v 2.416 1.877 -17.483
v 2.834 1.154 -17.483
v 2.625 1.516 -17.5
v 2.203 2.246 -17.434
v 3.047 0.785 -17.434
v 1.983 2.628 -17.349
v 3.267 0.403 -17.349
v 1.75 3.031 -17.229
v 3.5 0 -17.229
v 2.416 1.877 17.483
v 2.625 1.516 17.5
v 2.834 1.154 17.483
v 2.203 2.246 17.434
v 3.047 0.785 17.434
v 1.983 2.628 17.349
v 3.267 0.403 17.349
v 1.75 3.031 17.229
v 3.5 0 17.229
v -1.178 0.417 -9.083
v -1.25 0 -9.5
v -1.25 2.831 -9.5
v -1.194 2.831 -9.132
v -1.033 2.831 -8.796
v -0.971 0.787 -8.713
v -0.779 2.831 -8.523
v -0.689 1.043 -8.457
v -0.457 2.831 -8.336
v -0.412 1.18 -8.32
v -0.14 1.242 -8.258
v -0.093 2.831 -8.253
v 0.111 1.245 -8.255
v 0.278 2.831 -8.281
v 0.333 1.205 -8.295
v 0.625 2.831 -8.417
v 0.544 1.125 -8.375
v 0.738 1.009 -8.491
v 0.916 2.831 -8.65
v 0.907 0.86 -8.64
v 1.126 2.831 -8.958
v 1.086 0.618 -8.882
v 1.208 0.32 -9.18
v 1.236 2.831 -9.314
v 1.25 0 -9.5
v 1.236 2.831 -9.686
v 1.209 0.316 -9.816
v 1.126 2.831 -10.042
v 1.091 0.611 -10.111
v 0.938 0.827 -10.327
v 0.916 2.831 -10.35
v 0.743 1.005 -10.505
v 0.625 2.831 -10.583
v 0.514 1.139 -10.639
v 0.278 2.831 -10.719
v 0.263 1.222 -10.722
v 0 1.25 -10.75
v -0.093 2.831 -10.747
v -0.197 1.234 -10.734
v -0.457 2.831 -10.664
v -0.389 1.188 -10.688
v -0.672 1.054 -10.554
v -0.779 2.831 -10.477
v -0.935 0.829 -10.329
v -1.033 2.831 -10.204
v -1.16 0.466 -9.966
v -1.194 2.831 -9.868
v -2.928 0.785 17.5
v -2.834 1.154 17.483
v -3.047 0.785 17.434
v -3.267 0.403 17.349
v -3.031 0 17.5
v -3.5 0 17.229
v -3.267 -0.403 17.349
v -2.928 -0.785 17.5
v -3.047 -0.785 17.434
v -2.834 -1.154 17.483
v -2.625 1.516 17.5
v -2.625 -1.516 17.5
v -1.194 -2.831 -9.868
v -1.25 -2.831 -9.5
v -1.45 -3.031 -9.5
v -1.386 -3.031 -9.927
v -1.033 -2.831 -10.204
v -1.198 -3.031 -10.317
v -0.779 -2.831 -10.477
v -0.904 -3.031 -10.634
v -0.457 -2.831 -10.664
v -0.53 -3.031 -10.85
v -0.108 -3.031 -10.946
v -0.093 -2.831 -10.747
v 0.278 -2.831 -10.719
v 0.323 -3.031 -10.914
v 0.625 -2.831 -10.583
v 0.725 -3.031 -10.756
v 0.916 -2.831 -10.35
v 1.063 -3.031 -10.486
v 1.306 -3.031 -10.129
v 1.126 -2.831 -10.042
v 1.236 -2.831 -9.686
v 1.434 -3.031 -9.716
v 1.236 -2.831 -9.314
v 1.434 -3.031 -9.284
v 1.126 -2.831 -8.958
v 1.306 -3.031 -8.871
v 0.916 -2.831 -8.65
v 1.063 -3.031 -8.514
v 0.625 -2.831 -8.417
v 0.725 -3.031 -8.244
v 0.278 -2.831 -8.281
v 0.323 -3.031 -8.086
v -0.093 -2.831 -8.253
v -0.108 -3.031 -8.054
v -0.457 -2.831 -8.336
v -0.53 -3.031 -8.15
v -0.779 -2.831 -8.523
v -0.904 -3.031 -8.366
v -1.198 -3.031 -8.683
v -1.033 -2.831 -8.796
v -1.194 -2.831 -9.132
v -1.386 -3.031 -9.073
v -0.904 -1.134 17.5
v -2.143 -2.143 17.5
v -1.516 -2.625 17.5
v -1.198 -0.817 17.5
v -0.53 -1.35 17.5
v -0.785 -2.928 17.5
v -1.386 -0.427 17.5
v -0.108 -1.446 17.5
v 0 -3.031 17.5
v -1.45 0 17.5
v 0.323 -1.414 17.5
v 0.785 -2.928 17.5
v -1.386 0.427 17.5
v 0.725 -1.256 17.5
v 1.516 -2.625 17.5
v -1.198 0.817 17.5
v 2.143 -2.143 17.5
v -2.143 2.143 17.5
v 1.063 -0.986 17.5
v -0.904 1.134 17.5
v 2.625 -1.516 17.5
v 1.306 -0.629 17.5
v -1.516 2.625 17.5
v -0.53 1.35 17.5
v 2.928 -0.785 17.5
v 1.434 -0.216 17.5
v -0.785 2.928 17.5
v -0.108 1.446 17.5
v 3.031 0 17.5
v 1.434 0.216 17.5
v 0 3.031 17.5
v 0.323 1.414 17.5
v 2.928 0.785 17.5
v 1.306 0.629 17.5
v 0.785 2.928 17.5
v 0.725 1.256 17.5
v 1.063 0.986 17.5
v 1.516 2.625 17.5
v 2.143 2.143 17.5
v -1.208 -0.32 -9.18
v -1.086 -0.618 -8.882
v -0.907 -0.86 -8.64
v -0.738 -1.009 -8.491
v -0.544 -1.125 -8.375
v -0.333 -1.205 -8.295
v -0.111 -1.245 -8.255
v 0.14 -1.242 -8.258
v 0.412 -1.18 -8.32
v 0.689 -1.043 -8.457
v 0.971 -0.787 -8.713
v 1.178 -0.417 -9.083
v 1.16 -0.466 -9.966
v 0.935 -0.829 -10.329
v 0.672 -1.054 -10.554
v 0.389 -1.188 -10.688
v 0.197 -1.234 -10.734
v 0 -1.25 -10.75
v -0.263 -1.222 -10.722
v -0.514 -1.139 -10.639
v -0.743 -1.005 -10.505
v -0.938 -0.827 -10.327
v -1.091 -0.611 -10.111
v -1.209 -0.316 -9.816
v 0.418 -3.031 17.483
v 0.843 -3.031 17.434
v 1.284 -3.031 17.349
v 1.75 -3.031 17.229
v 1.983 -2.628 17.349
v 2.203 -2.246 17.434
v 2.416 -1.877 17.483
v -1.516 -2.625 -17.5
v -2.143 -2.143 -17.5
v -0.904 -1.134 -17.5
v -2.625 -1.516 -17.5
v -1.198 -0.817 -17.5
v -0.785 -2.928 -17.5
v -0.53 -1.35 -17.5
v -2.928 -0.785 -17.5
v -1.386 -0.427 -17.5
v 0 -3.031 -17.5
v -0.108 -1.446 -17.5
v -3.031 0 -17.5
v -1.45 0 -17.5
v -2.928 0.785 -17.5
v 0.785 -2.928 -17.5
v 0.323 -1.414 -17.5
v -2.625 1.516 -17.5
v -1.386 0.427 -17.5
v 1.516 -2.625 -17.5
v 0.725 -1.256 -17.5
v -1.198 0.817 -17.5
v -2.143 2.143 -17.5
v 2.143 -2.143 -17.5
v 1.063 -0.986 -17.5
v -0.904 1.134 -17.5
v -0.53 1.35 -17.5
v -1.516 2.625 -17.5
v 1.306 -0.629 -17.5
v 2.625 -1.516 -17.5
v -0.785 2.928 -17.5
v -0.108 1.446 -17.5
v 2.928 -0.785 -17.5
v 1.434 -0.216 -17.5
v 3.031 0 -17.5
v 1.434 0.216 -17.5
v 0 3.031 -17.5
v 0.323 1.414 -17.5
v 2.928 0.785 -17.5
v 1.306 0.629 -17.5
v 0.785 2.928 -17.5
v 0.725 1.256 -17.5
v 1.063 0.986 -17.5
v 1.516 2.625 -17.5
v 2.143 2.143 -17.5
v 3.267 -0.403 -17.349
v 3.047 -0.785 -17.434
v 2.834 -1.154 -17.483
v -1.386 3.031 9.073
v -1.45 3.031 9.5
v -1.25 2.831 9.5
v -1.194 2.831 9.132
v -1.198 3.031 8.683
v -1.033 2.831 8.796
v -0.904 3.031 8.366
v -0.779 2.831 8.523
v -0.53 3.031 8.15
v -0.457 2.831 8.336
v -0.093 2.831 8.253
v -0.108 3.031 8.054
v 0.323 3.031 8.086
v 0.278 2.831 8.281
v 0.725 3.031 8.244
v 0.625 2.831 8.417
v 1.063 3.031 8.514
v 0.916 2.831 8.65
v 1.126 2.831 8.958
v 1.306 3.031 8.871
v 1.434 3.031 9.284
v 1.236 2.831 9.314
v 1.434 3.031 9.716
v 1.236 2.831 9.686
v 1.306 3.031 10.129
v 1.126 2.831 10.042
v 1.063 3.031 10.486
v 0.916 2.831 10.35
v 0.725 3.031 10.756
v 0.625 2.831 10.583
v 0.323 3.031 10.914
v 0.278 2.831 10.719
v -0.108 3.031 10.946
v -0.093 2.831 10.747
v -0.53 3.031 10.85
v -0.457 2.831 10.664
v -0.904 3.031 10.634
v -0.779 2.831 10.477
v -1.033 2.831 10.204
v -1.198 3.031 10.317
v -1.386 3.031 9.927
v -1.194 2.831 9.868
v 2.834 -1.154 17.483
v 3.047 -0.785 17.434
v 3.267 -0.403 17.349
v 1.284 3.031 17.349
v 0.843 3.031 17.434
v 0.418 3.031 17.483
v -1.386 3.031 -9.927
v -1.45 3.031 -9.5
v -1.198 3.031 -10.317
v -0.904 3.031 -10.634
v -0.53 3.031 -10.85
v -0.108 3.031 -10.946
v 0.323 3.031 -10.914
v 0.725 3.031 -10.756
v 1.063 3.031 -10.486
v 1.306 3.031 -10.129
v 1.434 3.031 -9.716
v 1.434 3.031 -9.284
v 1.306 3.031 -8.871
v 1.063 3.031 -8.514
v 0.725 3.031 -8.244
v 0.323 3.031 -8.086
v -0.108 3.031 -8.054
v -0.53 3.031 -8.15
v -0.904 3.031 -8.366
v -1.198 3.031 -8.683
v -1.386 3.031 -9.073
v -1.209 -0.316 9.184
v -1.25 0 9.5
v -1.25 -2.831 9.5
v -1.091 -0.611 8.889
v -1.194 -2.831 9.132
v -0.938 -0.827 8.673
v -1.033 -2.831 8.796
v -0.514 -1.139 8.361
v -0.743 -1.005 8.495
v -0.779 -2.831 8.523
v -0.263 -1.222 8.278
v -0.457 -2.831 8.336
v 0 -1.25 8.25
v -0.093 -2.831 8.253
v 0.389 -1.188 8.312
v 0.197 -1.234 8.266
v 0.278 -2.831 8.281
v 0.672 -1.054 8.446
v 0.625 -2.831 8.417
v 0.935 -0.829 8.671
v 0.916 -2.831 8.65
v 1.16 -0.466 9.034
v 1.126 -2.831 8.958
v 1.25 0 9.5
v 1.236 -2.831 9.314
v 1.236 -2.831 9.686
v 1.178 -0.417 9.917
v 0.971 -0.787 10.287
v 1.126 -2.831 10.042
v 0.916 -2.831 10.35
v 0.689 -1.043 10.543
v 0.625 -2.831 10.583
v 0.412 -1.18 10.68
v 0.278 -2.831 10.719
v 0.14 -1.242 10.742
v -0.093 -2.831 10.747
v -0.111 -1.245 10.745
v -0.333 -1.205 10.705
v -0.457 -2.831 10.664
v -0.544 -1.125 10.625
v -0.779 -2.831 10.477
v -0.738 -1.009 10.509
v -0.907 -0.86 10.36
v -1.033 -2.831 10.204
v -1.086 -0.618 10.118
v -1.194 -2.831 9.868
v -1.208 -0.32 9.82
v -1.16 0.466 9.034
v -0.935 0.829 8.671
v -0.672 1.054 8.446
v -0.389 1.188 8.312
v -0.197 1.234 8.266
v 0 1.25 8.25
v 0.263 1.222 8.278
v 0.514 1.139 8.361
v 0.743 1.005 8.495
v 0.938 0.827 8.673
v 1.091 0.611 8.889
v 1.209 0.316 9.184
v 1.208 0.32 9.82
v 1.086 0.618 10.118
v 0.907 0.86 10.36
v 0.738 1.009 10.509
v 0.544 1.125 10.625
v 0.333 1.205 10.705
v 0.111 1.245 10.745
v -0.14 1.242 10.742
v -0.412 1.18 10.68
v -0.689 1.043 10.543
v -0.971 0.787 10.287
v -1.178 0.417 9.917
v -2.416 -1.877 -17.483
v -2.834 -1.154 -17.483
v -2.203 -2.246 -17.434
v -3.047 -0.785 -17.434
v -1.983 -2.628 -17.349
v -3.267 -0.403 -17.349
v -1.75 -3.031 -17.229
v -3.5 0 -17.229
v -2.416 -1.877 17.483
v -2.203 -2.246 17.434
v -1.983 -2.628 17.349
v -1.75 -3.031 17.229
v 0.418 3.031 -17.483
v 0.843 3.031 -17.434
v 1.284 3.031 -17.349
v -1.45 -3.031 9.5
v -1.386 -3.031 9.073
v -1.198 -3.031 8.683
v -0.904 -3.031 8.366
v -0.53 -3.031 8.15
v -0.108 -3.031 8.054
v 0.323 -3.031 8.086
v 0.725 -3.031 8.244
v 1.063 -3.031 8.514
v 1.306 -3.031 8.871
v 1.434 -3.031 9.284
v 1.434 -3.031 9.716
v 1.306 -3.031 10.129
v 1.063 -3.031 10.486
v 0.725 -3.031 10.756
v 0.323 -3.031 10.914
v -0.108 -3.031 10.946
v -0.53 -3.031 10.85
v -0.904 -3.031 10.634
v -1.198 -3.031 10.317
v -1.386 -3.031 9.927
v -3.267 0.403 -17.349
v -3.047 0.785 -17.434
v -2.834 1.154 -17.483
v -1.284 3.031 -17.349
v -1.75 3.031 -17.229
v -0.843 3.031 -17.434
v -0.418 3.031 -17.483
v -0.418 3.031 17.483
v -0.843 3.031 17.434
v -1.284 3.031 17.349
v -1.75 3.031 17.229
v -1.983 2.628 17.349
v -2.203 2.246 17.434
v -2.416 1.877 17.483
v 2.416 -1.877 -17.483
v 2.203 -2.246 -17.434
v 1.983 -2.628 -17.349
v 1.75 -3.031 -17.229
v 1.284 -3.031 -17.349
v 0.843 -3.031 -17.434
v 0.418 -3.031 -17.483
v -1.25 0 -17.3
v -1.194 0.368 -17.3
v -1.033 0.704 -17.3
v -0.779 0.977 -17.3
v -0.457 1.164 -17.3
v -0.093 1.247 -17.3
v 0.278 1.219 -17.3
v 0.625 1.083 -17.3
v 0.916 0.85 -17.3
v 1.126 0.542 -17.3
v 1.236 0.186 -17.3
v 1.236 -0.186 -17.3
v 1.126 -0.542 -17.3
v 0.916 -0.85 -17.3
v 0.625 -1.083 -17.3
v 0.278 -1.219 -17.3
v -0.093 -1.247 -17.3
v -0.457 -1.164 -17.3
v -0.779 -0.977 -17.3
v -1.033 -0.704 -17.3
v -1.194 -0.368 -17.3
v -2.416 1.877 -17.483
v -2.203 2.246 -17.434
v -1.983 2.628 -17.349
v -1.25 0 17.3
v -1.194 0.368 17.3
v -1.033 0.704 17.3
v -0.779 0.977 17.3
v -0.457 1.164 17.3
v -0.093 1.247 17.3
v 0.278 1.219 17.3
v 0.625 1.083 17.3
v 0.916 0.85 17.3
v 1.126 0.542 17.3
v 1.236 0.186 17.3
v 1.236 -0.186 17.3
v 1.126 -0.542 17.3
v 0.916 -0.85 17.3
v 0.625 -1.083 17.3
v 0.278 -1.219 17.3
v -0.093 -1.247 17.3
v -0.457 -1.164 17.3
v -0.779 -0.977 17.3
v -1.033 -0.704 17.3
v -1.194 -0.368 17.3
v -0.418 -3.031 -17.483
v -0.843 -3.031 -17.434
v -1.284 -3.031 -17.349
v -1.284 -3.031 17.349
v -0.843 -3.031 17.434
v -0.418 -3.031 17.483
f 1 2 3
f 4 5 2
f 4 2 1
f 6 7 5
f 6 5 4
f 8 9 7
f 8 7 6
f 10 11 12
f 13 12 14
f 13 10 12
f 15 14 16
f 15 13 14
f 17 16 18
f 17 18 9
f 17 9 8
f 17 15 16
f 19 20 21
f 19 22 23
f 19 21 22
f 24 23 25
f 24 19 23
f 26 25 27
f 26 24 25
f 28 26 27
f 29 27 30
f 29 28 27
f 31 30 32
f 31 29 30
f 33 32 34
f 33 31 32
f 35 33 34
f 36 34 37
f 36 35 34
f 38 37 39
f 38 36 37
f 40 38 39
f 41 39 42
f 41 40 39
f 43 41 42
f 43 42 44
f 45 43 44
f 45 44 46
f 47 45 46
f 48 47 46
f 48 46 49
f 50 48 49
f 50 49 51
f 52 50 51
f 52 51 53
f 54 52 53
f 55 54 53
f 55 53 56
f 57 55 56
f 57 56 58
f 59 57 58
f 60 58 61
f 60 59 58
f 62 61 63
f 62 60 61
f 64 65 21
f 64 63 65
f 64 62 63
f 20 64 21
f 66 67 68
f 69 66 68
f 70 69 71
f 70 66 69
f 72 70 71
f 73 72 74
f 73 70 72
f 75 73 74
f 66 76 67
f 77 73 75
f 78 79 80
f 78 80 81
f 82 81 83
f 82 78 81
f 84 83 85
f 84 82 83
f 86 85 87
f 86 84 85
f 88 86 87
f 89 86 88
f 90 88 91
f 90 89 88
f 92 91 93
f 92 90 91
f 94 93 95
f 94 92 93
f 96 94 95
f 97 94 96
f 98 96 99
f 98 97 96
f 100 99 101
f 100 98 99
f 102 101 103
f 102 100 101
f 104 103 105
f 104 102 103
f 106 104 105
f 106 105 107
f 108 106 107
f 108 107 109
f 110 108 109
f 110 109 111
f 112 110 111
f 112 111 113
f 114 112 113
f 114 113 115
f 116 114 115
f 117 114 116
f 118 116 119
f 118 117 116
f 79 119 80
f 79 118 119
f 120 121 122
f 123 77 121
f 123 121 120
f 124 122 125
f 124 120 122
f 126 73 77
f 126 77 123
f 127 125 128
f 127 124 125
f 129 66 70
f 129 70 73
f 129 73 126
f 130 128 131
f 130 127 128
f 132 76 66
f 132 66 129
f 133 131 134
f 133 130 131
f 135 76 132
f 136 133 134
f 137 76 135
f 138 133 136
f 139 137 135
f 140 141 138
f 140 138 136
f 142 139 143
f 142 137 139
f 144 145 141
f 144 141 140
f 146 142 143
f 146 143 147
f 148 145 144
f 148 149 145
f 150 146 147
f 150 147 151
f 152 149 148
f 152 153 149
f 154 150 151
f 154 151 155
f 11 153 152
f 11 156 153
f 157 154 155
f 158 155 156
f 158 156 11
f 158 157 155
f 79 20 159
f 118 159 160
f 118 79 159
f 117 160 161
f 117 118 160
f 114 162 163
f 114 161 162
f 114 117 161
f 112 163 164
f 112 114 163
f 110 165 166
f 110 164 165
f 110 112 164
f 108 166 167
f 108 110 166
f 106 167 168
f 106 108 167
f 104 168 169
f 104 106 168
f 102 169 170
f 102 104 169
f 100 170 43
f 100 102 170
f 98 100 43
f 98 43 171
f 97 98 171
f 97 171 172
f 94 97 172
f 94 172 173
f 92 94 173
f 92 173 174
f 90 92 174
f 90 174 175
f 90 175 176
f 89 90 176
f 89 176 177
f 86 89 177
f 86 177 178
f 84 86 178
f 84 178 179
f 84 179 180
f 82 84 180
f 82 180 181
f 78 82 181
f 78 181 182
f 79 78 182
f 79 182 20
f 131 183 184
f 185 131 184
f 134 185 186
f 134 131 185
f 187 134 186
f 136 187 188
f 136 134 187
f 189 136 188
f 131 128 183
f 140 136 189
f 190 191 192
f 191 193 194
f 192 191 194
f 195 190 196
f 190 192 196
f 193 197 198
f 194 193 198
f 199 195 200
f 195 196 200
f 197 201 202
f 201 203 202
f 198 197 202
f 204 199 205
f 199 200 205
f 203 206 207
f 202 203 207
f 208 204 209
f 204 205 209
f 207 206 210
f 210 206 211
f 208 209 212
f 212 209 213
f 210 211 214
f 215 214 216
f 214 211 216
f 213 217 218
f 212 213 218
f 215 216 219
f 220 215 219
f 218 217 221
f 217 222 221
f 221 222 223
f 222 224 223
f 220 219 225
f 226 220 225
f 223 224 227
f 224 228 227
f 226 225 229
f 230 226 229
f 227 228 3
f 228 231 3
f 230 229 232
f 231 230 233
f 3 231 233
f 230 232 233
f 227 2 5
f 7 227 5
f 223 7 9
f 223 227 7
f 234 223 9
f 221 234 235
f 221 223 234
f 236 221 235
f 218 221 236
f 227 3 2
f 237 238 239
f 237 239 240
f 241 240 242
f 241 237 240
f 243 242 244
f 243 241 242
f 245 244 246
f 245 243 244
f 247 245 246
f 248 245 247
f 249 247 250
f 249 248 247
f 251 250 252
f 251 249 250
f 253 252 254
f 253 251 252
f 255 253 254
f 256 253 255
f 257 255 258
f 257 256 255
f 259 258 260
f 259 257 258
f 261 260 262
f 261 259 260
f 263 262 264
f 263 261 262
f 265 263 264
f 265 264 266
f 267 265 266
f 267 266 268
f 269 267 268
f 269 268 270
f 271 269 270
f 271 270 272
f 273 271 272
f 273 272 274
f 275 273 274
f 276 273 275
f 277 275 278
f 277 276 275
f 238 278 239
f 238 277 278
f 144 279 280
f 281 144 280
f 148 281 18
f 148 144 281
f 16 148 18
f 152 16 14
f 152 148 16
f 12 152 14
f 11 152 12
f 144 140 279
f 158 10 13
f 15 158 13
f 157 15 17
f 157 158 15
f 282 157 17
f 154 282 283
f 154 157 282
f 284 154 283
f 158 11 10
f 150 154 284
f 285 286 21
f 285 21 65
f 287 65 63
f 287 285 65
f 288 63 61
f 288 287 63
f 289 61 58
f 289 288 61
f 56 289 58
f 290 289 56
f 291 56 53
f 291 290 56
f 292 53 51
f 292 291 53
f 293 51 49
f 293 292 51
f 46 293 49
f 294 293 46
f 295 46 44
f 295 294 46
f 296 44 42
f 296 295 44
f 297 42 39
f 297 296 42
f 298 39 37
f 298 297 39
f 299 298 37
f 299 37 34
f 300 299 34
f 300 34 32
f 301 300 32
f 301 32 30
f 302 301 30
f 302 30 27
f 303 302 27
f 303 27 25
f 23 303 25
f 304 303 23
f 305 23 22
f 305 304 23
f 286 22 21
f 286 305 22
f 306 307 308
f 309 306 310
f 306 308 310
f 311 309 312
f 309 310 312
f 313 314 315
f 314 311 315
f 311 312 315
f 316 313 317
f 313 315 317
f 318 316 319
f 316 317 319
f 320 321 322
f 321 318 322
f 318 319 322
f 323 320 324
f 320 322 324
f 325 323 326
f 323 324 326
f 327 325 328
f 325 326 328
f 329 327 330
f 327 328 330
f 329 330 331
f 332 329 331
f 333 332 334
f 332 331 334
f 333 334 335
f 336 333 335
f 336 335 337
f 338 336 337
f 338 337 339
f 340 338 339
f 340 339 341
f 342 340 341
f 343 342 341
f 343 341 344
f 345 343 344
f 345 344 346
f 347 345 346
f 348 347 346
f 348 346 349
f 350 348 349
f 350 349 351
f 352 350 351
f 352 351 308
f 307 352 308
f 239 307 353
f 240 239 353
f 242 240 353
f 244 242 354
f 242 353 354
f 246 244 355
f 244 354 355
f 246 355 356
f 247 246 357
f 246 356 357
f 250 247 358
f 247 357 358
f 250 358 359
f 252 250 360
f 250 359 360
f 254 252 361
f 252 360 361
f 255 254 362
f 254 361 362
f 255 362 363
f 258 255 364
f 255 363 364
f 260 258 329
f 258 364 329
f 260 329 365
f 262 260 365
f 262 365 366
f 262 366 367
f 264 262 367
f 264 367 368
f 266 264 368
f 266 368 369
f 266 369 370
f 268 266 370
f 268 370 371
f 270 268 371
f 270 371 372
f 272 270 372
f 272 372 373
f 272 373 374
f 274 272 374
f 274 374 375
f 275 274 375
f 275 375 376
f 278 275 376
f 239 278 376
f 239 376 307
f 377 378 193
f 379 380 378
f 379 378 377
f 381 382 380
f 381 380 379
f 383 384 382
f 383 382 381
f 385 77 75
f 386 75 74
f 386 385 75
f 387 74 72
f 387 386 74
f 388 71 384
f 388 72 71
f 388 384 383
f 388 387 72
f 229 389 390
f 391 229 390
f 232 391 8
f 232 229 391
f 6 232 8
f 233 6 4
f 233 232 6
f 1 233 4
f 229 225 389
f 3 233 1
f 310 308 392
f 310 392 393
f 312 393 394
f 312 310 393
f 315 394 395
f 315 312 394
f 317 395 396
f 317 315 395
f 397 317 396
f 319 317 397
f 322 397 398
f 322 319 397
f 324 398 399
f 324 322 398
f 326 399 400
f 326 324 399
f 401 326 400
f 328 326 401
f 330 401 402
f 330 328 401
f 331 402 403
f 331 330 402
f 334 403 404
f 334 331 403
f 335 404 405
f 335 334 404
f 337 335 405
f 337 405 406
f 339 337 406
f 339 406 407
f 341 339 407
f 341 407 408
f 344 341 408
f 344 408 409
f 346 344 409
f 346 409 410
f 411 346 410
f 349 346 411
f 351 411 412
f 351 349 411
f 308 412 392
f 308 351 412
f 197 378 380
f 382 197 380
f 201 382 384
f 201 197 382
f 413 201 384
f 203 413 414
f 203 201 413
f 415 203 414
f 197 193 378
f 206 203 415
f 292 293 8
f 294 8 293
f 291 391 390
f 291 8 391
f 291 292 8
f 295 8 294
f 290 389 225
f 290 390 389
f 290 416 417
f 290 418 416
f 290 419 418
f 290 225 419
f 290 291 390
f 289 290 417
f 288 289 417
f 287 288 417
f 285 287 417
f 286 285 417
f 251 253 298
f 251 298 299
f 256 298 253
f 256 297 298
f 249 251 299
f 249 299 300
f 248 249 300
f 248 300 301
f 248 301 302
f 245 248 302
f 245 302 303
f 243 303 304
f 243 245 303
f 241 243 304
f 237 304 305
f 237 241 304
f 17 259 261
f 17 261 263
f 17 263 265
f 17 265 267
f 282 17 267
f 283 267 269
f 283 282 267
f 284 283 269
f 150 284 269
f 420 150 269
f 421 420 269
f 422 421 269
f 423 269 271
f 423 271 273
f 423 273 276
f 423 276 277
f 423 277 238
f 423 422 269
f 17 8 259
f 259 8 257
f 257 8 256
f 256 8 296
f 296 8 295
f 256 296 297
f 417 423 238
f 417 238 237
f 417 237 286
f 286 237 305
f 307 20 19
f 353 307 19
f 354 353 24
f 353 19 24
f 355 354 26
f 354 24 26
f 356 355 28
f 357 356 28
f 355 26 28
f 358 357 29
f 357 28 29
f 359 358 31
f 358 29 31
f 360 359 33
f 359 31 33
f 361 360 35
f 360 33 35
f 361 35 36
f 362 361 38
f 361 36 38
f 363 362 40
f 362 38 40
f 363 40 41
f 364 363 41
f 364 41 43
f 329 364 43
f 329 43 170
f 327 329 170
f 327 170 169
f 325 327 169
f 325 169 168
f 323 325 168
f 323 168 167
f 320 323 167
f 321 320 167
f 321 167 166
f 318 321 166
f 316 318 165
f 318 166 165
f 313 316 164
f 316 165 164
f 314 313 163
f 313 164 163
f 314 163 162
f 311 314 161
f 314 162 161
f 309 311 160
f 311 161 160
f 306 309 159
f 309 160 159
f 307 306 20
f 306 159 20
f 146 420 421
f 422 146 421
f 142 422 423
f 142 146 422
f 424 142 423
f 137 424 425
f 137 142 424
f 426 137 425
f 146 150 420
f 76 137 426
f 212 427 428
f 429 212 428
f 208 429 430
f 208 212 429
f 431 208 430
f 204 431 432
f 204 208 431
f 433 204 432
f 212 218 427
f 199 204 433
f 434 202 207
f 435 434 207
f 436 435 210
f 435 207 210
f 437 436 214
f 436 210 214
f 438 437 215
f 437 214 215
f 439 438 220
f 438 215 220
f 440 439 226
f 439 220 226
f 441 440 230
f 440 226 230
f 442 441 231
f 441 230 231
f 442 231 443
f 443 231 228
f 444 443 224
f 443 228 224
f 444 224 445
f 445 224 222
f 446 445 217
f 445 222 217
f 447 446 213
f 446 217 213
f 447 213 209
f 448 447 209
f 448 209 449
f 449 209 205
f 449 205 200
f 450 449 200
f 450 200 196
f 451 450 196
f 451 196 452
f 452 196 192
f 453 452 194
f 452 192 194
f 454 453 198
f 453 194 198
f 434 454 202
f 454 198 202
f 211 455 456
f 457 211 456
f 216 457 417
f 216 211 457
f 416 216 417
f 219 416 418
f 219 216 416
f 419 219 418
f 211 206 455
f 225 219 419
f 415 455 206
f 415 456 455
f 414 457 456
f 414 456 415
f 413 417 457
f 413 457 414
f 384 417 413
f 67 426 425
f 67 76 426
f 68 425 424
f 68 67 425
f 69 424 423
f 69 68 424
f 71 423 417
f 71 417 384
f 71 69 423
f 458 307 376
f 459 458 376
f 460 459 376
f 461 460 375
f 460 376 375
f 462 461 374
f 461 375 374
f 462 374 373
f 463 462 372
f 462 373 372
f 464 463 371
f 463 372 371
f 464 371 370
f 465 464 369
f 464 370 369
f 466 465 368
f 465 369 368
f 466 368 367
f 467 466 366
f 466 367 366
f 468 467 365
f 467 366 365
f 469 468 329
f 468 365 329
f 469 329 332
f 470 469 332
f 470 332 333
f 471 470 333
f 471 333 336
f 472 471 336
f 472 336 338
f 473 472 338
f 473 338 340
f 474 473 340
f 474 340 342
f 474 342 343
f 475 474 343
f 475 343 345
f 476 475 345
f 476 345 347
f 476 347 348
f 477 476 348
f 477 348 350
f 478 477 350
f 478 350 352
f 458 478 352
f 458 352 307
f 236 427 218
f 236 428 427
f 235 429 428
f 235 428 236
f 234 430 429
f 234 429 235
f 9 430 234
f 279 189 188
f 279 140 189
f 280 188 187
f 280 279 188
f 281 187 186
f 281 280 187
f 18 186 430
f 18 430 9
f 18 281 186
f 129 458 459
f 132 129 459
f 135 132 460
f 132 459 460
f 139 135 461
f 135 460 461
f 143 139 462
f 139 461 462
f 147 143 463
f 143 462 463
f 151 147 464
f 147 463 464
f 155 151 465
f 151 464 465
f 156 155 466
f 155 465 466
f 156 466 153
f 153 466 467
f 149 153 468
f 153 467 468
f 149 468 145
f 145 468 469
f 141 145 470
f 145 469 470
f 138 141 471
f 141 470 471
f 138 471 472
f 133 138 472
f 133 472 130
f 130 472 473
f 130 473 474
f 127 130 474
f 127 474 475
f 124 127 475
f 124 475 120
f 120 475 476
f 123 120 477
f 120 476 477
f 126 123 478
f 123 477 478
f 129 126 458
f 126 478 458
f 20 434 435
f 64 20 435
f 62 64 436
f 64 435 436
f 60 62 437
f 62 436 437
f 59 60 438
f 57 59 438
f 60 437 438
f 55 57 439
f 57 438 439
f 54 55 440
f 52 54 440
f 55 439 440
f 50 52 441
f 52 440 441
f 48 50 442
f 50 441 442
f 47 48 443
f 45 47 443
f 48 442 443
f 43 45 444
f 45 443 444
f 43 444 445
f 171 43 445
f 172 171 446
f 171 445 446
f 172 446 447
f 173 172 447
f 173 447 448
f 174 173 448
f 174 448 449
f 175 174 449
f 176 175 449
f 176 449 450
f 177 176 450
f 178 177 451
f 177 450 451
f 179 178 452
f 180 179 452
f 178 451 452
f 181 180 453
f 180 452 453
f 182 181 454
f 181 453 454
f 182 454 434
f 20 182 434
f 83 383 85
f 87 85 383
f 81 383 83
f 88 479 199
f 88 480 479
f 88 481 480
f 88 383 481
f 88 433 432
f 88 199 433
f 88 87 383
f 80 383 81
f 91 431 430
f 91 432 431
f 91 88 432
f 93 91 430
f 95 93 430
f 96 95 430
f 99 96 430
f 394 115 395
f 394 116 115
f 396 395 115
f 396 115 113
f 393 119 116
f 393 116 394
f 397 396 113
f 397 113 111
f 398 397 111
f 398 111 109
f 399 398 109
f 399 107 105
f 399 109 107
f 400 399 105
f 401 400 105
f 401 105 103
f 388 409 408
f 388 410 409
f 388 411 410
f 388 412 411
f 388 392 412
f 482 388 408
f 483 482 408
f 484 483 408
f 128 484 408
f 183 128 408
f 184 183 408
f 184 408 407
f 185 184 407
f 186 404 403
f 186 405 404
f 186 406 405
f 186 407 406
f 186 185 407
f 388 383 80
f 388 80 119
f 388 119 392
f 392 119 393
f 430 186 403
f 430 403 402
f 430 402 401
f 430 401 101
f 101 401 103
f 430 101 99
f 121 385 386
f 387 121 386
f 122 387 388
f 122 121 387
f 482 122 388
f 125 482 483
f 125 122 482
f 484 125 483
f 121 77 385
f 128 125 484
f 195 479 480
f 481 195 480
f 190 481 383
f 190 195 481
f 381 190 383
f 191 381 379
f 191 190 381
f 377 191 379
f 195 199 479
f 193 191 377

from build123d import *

# Parameters (mm, degrees)
EXTRUDE_1_DEPTH          = 17.5
SKETCH_2_OUTSIDE_W       = 142.004
SKETCH_2_OUTSIDE_H       = 141.066
SKETCH_2_OUTSIDE_R       = 3.031088913
CUT_EXTRUDE_1_DEPTH      = 36.304921753
CUT_EXTRUDE_1_DRAFT      = -60
HOLE_WIZARD_M3_1_D       = 2.5
HOLE_WIZARD_M3_2_D       = 2.5
MIRROR_1_COPY_1_SKETCH_W = 142.004
MIRROR_1_COPY_1_SKETCH_H = 141.066
MIRROR_1_COPY_1_SKETCH_R = 3.031088913
MIRROR_1_COPY_1_DEPTH    = 36.304921753
MIRROR_1_COPY_1_DRAFT    = -60
CHAMFER_1_SIZE           = 0.2


with BuildPart() as part:
    # 草图1 → 凸台-拉伸1 (new, symmetric)
    with BuildSketch(Plane.XY):
        Polygon((3.5, 0), (1.75, 3.031088913), (-1.75, 3.031088913), (-3.5, 0), (-1.75, -3.031088913), (1.75, -3.031088913), align=None)
    extrude(amount=EXTRUDE_1_DEPTH, both=True)


with BuildPart() as cut_extrude_1_tool:
    # 草图2 outside → 切除-拉伸1 (with draft: the straight prism first)
    with BuildSketch(Plane.XY.offset(17.5)):
        Rectangle(SKETCH_2_OUTSIDE_W, SKETCH_2_OUTSIDE_H)
        Circle(SKETCH_2_OUTSIDE_R, mode=Mode.SUBTRACT)
    extrude(amount=-CUT_EXTRUDE_1_DEPTH)
    # 切除-拉伸1: the draft: its side faces are tilted about the plane it starts from
    cut_extrude_1_sides = [cut_extrude_1_tool.faces().sort_by_distance(p)[0] for p in [
        (0, -70.533, -0.652460877),
        (71.002, 0, -0.652460877),
        (0, 70.533, -0.652460877),
        (-71.002, 0, -0.652460877),
        (-3.031088913, 0, -0.652460877),
    ]]
    draft(cut_extrude_1_sides, Plane.XY.offset(17.5), CUT_EXTRUDE_1_DRAFT)


with BuildPart() as part_1:
    add(part.part)

    # 切除-拉伸1: cut by cut_extrude_1_tool
    add(cut_extrude_1_tool.part, mode=Mode.SUBTRACT)

    # M3 螺纹孔1 (through all)
    with Locations(Plane.XY.offset(17.5)):
        with Locations((0, 0)):
            hole_wizard_m3_1 = Hole(HOLE_WIZARD_M3_1_D / 2)

    # M3 螺纹孔2 (through all)
    with Locations(Plane(origin=(0, 3.031088913, 0), x_dir=(1, 0, 0), z_dir=(0, 1, 0))):
        with Locations((0, -9.5)):
            hole_wizard_m3_2 = Hole(HOLE_WIZARD_M3_2_D / 2)

    # 镜向1: M3 螺纹孔1, M3 螺纹孔2 across plane
    add(hole_wizard_m3_1.mirror(Plane.XY), mode=Mode.SUBTRACT)
    add(hole_wizard_m3_2.mirror(Plane.XY), mode=Mode.SUBTRACT)


with BuildPart() as mirror_1_copy_1_tool:
    # 镜向1 copy 1 sketch → 镜向1 copy 1 (with draft: the straight prism first)
    with BuildSketch(Plane(origin=(0, 0, -17.5), x_dir=(1, 0, 0), z_dir=(0, 0, -1))):
        Rectangle(MIRROR_1_COPY_1_SKETCH_W, MIRROR_1_COPY_1_SKETCH_H)
        Circle(MIRROR_1_COPY_1_SKETCH_R, mode=Mode.SUBTRACT)
    extrude(amount=-MIRROR_1_COPY_1_DEPTH)
    # 镜向1 copy 1: the draft: its side faces are tilted about the plane it starts from
    mirror_1_copy_1_sides = [mirror_1_copy_1_tool.faces().sort_by_distance(p)[0] for p in [
        (0, -70.533, 0.652460877),
        (71.002, 0, 0.652460877),
        (0, 70.533, 0.652460877),
        (-71.002, 0, 0.652460877),
        (-3.031088913, 0, 0.652460877),
    ]]
    draft(mirror_1_copy_1_sides, Plane(origin=(0, 0, -17.5), x_dir=(1, 0, 0), z_dir=(0, 0, -1)), MIRROR_1_COPY_1_DRAFT)


with BuildPart() as part_2:
    add(part_1.part)

    # 镜向1 copy 1: cut by mirror_1_copy_1_tool
    add(mirror_1_copy_1_tool.part, mode=Mode.SUBTRACT)

    # 倒角1
    chamfer_1_edges = [part_2.edges().sort_by_distance(p)[0] for p in [
        (1.25, -3.031088913, -9.5),
        (1.25, 3.031088913, -9.5),
        (1.25, 0, 17.5),
        (1.25, 0, -17.5),
        (1.25, -3.031088913, 9.5),
        (1.25, 3.031088913, 9.5),
    ]]
    chamfer(chamfer_1_edges, length=CHAMFER_1_SIZE)


solid = part_2.part
